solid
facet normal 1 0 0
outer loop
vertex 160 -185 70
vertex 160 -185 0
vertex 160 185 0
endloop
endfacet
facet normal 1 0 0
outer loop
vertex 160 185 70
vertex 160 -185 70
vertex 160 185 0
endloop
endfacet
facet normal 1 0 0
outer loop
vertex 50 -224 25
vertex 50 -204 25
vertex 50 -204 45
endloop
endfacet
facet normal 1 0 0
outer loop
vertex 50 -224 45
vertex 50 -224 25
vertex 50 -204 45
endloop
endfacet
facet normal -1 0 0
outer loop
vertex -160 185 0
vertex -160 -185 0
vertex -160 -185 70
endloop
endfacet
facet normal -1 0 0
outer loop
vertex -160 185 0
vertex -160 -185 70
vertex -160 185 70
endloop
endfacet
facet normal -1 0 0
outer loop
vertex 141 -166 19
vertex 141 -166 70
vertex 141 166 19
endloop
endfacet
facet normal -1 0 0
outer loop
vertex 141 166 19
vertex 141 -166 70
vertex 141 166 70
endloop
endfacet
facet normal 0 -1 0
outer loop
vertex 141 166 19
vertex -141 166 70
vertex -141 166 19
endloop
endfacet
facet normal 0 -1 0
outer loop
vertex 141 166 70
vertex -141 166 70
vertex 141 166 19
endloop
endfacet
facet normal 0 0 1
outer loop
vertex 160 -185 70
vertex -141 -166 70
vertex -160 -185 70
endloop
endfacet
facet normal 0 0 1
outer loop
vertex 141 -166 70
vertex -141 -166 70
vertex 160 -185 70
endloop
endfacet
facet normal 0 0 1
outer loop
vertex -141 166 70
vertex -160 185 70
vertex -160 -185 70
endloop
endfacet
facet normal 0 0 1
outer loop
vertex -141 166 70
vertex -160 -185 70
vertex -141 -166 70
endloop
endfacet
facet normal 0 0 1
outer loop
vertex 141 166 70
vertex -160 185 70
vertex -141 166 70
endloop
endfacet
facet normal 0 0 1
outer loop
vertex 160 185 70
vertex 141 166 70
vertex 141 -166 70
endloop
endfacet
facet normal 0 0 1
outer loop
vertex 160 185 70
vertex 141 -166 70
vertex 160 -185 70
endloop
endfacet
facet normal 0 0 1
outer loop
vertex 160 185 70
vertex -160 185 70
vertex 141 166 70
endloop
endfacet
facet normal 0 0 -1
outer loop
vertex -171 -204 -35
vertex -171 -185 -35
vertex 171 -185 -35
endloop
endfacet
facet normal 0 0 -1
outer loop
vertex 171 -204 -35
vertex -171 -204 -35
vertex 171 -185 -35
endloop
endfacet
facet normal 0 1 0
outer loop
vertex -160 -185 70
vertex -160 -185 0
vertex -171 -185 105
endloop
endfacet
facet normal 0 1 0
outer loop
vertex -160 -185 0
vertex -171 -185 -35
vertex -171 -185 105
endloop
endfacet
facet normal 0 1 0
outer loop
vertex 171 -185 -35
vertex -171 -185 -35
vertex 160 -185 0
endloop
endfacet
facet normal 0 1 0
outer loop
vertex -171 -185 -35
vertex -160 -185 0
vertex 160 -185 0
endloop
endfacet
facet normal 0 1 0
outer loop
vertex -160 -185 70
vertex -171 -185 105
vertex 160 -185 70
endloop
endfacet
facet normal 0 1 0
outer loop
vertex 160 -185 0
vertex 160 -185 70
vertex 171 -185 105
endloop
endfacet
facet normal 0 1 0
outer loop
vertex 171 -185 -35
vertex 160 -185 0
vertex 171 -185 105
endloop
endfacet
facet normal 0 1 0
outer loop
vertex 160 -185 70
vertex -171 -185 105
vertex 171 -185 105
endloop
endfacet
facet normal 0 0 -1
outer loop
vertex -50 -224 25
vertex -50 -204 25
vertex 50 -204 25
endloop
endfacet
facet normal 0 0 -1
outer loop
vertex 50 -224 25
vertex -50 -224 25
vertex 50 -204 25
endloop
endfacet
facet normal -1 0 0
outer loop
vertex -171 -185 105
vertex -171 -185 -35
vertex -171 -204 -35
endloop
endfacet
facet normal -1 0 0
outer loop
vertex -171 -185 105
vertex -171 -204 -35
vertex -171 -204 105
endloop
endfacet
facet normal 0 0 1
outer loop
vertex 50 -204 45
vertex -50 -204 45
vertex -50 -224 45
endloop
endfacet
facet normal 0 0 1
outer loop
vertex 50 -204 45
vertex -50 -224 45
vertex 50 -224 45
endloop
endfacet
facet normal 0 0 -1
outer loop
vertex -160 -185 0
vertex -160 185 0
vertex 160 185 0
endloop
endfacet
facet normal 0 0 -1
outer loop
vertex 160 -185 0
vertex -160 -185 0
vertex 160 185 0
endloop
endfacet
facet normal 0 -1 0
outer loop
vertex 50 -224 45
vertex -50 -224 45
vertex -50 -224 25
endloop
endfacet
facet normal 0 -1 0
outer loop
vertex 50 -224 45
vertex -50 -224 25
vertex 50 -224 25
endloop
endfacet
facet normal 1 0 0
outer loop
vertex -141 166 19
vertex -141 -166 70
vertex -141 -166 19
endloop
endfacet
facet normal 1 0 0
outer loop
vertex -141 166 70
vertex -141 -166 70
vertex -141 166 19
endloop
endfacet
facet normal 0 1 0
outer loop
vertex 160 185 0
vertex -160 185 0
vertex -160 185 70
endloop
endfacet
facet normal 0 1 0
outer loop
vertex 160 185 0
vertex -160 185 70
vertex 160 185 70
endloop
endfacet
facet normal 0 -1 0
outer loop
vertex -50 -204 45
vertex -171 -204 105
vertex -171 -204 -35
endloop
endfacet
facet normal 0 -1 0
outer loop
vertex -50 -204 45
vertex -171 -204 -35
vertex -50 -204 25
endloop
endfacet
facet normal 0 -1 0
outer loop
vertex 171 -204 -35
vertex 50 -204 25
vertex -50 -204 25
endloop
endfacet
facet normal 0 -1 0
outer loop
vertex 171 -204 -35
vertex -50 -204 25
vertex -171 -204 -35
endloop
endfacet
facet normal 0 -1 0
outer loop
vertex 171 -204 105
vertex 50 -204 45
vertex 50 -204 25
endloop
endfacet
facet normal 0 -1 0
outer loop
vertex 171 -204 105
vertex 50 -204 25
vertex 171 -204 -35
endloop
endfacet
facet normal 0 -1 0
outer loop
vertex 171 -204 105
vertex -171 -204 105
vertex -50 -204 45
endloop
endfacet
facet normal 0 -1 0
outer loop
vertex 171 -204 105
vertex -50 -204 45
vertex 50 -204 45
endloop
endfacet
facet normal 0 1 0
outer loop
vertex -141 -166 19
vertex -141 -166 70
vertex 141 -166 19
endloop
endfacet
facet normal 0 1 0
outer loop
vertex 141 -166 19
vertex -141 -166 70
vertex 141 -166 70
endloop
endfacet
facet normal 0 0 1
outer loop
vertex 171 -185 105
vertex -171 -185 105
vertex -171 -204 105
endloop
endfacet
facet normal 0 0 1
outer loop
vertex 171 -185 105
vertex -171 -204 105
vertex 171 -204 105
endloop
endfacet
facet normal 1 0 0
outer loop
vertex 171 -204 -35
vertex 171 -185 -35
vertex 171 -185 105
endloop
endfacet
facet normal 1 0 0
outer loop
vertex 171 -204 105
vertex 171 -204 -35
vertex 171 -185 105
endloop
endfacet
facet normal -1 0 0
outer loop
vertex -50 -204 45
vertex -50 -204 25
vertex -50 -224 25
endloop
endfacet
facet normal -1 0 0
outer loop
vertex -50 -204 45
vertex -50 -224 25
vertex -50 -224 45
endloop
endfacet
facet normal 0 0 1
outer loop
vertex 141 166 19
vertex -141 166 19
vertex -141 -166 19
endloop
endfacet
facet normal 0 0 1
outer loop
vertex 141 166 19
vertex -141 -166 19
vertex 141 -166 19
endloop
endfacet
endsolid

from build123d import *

# Parameters (mm, degrees)
F0_W     = 320
F0_H     = 370
F1_DEPTH = 70
F2_W     = 282
F2_H     = 332
F3_DEPTH = 51
F4_W     = 342
F4_H     = 140
F4_W_2   = 320
F4_H_2   = 70
F5_DEPTH = 19
F6_W     = 100
F6_H     = 20
F7_DEPTH = 20


with BuildPart() as f1:
    # F0 (on Top) → F1 (new body)
    with BuildSketch(Plane.XY):
        Rectangle(F0_W, F0_H)
    extrude(amount=F1_DEPTH)

    # F2 (on face) → F3 (cut)
    with BuildSketch(Plane.XY.offset(70)):
        Rectangle(F2_W, F2_H)
    extrude(amount=-F3_DEPTH, mode=Mode.SUBTRACT)

    # F4 (on face) → F5 (join)
    with BuildSketch(Plane.XZ.offset(185)):
        with Locations((0, 35)):
            Rectangle(F4_W, F4_H)
        with Locations((0, 35)):
            Rectangle(F4_W_2, F4_H_2, mode=Mode.SUBTRACT)
        with Locations((0, 35)):
            Rectangle(F4_W_2, F4_H_2)
    extrude(amount=F5_DEPTH)

    # F6 (on face) → F7 (join)
    with BuildSketch(Plane.XZ.offset(204)):
        with Locations((0, 35)):
            Rectangle(F6_W, F6_H)
    extrude(amount=F7_DEPTH)


solid = f1.part
